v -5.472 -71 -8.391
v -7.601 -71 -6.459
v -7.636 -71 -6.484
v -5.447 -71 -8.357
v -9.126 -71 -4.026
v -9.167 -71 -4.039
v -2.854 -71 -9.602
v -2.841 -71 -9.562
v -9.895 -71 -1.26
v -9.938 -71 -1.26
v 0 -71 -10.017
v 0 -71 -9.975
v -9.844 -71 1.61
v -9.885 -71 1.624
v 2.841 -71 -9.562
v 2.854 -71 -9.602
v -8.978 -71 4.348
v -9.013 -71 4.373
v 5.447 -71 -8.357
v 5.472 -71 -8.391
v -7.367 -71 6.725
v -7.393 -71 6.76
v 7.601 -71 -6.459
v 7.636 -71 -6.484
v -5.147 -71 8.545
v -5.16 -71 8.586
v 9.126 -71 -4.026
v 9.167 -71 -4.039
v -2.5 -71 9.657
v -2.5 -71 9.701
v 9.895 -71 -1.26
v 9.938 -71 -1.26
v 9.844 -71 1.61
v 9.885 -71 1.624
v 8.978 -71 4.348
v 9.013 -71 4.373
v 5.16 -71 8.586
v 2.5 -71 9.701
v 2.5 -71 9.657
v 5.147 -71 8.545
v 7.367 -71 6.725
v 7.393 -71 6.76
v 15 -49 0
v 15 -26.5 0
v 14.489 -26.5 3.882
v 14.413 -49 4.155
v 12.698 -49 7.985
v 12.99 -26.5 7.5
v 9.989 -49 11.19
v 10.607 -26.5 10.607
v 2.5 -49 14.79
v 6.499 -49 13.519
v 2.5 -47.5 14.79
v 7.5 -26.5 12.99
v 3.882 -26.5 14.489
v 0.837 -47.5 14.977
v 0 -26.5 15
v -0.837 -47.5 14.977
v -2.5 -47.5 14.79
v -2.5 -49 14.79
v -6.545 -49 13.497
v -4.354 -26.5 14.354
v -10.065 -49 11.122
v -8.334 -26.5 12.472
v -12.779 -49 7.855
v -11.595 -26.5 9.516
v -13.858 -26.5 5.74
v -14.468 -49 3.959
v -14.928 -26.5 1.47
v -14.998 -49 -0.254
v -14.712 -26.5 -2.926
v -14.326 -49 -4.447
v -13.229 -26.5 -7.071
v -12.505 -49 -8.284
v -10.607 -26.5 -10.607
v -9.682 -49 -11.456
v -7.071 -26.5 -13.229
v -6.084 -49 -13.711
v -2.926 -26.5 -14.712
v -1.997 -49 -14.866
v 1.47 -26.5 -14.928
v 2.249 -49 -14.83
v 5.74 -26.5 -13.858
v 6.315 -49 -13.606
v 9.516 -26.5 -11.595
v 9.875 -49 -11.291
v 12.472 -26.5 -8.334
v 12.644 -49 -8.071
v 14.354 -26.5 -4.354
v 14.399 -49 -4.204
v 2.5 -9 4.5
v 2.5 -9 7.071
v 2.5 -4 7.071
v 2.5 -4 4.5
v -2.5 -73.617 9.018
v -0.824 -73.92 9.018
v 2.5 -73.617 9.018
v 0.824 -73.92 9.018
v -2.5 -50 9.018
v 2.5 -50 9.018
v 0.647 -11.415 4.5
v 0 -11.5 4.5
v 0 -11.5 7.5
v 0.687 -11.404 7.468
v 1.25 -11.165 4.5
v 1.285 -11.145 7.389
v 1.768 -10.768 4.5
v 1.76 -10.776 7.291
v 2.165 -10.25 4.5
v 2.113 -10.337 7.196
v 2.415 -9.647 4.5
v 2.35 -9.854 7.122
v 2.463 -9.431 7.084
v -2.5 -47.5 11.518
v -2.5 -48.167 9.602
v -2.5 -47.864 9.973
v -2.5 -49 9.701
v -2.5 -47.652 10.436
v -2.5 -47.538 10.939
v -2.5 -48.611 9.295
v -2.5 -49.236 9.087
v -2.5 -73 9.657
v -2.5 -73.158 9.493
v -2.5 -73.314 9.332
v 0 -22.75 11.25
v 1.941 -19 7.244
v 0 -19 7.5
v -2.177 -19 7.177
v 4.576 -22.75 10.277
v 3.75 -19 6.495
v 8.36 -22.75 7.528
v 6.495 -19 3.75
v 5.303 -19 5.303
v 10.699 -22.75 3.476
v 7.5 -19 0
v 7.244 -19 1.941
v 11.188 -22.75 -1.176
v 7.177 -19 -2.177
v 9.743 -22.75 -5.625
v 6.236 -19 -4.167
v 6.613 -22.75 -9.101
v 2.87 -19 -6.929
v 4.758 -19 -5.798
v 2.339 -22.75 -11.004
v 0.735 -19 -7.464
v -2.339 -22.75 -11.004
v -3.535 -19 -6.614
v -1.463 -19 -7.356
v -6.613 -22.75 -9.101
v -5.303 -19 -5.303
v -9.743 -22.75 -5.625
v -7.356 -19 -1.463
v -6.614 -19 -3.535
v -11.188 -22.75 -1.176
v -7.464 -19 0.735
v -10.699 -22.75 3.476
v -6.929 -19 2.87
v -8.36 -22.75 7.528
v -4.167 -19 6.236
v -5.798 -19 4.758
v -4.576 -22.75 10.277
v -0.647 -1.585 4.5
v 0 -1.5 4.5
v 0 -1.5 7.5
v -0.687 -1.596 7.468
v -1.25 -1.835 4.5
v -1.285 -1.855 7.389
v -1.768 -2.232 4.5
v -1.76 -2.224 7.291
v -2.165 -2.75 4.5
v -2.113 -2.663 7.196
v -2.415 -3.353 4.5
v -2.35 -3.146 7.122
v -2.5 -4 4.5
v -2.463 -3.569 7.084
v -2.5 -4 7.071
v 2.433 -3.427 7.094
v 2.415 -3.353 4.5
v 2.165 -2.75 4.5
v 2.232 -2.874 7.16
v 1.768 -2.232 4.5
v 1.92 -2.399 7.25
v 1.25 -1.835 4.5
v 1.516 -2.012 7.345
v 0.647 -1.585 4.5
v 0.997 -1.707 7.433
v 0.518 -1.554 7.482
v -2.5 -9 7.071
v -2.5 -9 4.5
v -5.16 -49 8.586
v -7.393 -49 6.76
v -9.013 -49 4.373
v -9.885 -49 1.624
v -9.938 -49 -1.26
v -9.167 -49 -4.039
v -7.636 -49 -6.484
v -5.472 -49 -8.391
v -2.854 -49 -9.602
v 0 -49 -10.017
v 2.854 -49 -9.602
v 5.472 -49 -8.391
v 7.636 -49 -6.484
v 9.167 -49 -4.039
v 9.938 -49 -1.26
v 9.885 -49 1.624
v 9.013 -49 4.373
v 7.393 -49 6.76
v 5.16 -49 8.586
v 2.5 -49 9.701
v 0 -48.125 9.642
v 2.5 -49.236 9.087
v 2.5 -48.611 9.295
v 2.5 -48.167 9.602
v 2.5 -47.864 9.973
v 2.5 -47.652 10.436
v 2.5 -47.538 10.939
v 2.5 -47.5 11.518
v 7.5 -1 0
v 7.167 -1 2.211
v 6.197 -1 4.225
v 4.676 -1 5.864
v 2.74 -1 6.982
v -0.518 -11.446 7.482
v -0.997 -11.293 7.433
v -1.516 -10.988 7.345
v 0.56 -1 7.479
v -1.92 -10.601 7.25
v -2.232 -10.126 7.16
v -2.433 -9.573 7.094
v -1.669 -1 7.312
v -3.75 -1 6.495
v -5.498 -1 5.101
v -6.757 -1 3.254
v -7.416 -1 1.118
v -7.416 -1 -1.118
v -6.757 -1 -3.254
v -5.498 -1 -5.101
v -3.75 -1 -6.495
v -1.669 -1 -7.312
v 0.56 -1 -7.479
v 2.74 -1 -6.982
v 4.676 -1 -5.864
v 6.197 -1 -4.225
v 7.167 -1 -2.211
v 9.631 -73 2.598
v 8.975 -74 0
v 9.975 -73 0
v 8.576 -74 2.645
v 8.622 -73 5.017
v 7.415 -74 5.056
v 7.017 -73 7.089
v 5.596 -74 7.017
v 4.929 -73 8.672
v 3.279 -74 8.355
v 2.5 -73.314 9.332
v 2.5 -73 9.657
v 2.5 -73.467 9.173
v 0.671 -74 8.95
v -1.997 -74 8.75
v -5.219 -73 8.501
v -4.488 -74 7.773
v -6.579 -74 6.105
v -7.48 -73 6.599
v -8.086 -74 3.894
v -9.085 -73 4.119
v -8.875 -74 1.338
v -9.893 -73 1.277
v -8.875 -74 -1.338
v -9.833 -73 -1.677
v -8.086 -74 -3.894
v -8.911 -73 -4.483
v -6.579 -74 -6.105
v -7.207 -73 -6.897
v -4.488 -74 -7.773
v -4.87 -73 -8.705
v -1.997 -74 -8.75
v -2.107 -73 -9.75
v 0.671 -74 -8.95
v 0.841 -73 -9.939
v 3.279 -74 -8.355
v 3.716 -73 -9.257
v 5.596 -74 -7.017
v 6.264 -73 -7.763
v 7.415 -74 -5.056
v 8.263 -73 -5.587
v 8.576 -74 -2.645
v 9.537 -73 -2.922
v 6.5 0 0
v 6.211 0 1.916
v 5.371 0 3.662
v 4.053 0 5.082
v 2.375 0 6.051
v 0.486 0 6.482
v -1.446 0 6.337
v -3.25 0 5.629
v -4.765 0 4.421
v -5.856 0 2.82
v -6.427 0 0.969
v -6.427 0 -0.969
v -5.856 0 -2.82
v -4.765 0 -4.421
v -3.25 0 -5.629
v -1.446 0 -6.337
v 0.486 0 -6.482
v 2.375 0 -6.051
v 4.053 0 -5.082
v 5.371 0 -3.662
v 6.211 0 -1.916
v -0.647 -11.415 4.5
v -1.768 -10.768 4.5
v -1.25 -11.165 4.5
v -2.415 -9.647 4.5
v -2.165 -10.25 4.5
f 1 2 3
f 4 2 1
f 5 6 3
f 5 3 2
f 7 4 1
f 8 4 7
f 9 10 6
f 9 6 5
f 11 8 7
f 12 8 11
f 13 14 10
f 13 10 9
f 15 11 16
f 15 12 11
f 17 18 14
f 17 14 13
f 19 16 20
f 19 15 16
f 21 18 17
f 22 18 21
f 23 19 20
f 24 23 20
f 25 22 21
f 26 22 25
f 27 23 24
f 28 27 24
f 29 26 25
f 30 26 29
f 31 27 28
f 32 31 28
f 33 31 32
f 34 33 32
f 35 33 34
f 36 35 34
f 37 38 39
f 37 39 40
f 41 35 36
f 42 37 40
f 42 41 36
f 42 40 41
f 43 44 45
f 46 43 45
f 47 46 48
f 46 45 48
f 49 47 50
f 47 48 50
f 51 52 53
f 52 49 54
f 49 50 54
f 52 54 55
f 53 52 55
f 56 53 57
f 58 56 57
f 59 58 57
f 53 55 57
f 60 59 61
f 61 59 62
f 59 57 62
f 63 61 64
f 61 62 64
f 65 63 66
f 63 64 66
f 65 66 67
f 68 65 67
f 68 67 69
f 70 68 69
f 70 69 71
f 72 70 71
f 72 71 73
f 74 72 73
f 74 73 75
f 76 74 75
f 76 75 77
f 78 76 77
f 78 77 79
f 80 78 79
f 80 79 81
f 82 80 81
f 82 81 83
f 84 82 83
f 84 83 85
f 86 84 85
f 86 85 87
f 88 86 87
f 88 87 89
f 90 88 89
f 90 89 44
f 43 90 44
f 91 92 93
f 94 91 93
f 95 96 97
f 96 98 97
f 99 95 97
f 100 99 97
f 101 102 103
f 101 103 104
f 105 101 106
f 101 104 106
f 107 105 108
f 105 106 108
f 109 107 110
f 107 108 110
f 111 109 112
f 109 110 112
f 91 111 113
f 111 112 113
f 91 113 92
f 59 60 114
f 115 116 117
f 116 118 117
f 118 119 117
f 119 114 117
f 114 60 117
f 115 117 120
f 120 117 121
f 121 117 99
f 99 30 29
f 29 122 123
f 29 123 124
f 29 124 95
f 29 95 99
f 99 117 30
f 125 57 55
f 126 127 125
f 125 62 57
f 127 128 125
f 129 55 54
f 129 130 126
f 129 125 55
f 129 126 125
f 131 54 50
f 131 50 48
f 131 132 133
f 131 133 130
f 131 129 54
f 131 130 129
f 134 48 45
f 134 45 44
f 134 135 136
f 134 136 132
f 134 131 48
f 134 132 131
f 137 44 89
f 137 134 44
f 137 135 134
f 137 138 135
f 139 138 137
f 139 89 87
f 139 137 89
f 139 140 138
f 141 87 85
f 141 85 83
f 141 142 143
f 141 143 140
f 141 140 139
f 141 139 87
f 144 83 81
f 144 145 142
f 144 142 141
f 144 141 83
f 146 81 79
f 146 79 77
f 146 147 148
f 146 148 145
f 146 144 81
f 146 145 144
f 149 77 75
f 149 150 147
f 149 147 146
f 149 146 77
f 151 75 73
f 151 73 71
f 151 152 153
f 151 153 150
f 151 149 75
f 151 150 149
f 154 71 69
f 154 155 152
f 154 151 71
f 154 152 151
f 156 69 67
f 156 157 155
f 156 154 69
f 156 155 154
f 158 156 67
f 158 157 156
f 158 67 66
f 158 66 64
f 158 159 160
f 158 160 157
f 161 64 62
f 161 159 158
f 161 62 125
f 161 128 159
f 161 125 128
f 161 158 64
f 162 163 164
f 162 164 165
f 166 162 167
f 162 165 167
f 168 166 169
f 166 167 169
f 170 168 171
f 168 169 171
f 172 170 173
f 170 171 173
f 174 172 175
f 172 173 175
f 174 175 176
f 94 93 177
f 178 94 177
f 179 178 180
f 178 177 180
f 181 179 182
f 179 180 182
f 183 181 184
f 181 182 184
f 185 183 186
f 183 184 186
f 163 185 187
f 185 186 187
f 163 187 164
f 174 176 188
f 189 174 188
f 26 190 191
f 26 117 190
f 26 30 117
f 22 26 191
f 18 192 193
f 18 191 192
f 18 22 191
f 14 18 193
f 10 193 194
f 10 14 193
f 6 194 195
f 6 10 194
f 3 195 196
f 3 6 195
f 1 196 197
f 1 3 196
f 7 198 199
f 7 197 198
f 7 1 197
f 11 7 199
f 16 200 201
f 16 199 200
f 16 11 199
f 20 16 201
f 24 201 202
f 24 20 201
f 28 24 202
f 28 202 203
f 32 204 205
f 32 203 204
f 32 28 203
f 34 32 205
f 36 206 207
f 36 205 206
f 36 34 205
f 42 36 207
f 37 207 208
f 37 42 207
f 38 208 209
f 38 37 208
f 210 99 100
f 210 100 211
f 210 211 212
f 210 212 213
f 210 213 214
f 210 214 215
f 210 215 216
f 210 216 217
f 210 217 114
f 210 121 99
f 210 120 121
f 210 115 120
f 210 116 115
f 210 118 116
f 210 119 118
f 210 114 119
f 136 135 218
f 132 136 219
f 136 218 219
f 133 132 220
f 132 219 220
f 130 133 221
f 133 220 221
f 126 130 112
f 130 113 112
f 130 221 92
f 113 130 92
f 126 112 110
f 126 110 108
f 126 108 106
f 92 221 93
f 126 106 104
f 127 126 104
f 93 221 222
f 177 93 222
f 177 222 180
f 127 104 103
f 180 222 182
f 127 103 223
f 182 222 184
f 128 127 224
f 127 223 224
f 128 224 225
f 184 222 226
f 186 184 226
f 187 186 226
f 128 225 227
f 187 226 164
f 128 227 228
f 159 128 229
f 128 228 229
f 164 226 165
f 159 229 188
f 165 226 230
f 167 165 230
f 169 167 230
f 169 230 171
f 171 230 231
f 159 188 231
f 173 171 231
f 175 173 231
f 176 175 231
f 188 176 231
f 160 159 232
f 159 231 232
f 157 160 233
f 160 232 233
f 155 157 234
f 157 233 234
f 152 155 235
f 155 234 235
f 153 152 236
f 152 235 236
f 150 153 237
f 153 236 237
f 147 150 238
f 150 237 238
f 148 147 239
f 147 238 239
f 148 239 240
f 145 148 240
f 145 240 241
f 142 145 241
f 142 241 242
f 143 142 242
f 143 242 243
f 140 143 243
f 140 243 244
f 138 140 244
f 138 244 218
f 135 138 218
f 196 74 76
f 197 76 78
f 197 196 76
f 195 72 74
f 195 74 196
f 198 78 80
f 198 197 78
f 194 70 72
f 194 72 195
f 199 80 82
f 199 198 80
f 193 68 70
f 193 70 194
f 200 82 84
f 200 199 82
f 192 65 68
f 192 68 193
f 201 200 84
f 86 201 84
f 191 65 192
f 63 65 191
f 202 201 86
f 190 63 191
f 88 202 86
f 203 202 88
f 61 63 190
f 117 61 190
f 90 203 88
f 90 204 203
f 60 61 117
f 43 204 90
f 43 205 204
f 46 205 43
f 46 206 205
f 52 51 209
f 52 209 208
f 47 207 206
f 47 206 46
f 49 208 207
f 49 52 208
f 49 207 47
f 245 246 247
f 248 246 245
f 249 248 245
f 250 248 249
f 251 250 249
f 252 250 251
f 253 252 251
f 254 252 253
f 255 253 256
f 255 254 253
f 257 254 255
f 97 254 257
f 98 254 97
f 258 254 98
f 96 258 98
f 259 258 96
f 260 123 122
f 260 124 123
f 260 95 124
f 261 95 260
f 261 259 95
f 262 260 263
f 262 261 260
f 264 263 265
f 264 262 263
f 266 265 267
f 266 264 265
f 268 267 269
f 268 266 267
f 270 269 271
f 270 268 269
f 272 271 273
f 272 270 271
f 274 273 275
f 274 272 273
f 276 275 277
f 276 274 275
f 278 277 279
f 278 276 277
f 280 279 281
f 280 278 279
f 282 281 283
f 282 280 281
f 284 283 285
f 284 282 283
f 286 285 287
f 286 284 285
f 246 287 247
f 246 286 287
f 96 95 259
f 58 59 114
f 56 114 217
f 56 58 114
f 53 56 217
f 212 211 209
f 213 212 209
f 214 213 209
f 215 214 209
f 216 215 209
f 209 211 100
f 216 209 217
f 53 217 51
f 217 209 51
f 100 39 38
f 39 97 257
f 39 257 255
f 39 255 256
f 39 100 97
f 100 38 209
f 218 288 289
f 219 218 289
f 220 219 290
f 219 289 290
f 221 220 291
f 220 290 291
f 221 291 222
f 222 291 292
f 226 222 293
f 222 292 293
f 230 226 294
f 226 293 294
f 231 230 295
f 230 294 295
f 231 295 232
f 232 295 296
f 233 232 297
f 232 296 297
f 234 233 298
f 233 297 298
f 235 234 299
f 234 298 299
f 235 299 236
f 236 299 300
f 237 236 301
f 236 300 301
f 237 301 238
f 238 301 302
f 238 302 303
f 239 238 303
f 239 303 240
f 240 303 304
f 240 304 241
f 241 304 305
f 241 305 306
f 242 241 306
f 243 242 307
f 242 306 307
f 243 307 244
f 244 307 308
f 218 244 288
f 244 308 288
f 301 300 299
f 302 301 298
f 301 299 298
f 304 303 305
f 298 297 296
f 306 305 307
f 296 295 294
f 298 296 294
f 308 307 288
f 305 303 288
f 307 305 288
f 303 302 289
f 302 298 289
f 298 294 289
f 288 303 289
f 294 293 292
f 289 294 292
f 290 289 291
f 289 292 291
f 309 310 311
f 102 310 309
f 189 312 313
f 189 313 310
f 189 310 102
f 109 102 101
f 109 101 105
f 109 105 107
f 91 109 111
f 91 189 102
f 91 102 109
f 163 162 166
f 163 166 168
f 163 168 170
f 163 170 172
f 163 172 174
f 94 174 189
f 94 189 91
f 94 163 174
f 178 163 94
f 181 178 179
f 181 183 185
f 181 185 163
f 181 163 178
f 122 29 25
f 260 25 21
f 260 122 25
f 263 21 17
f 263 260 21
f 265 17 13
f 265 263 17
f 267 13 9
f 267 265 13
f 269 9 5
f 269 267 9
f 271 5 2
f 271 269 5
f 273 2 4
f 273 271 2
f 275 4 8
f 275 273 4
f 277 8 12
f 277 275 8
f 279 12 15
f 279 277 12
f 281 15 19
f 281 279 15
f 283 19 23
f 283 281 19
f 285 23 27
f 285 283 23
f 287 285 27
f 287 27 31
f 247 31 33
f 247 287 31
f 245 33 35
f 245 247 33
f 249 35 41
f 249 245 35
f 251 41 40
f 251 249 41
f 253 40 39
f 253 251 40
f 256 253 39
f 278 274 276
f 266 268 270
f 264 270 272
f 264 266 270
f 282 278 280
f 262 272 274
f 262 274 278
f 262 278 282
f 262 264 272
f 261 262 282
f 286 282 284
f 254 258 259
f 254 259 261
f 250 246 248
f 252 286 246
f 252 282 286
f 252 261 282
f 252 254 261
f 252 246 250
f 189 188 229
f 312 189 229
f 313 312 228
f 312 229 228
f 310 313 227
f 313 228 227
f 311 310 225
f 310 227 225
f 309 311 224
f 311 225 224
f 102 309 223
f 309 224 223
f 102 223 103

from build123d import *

# Parameters (mm, degrees)
F0_R         = 15
F1_DEPTH     = 74
F2_R         = 15
F2_R_2       = 9.975
F3_DEPTH     = 3
F4_R         = 15
F4_R_2       = 10.0175
F5_DEPTH     = 22
F6_R         = 15
F6_R_2       = 7.5
F7_DEPTH     = 19
F8_SIZE2     = 1
F8_SIZE      = 1
F12_DEPTH    = 26.5
F13_T1_DEPTH = 5
F16_DEPTH    = 3


# Not quite as in the source:
# - a fillet or chamfer that OpenCascade refuses, or shapes differently, is made with other operations: its cross-section is extruded or revolved along the edge and cut away or added


with BuildPart() as f1:
    # F0 (on Front) → F1 (new body)
    with BuildSketch(Plane.XZ):
        Circle(F0_R)
    extrude(amount=F1_DEPTH)

    # F2 (on face) → F3 (cut)
    with BuildSketch(Plane.XZ.offset(74)):
        Circle(F2_R)
        Circle(F2_R_2, mode=Mode.SUBTRACT)
    extrude(amount=-F3_DEPTH, mode=Mode.SUBTRACT)

    # F4 (on face) → F5 (cut)
    with BuildSketch(Plane.XZ.offset(71)):
        Circle(F4_R)
        Circle(F4_R_2, mode=Mode.SUBTRACT)
    extrude(amount=-F5_DEPTH, mode=Mode.SUBTRACT)

    # F6 (on Front) → F7 (cut)
    with BuildSketch(Plane.XZ):
        Circle(F6_R)
        Circle(F6_R_2, mode=Mode.SUBTRACT)
    extrude(amount=F7_DEPTH, mode=Mode.SUBTRACT)

    # F8
    f8_edges = [f1.edges().sort_by_distance(p)[0] for p in [
        (-7.5, 0, 0),
        (-9.975, -74, 0),
    ]]
    chamfer(f8_edges, length=F8_SIZE, length2=F8_SIZE2)

    # F9 (on Right) → F10 (revolve, cut)
    with BuildSketch(Plane.YZ):
        Polygon((-26.5, 15), (-19, 7.5), (-19, 15), align=None)
    revolve(axis=Axis((0, -22.75, 0), (0, 1, 0)), mode=Mode.SUBTRACT)

    # F11 (on face) → F12 (cut)
    with BuildSketch(Plane.XZ.offset(74)):
        with BuildLine():
            Line((-2.5, 14.7901994577), (-2.5, 10.0175))
            Line((-2.5, 10.0175), (-2.5, 9.0175))
            Line((-2.5, 9.0175), (0, 9.0175))
            Line((0, 9.0175), (2.5, 9.0175))
            Line((2.5, 9.0175), (2.5, 10.0175))
            Line((2.5, 10.0175), (2.5, 14.7901994577))
            ThreePointArc((2.5, 14.7901994577), (0, 15), (-2.5, 14.7901994577))
        make_face()
    extrude(amount=-F12_DEPTH, mode=Mode.SUBTRACT)

    # F13: fillet of radius 2.5 on 1 edges, made by hand

    # F13_s2 → F13_t1 (join)
    with BuildSketch(Plane.YZ.offset(-2.5)):
        with BuildLine():
            add(Edge.make_bspline(
                [(-50, 9.0175), (-47.5, 9.0175), (-47.5, 11.5175)],
                knots=[0, 0, 0, 1, 1, 1], degree=2, weights=[1, 1, 1]))
            Line((-47.5, 11.5175), (-47.45, 11.5175))
            Line((-47.45, 11.5175), (-47.45, 8.9675))
            Line((-47.45, 8.9675), (-50, 8.9675))
            Line((-50, 8.9675), (-50, 9.0175))
        make_face()
    extrude(amount=F13_T1_DEPTH)

    # F15 (on offset) → F16 (cut)
    with BuildSketch(Plane.XY.offset(7.5)):
        with BuildLine():
            Line((2.5, -9), (2.5, -4))
            ThreePointArc((2.5, -4), (1.767766953, -2.232233047), (0, -1.5))
            ThreePointArc((0, -1.5), (-1.767766953, -2.232233047), (-2.5, -4))
            Line((-2.5, -4), (-2.5, -9))
            ThreePointArc((-2.5, -9), (-1.767766953, -10.767766953), (0, -11.5))
            ThreePointArc((0, -11.5), (1.767766953, -10.767766953), (2.5, -9))
        make_face()
    extrude(amount=-F16_DEPTH, mode=Mode.SUBTRACT)


solid = f1.part
